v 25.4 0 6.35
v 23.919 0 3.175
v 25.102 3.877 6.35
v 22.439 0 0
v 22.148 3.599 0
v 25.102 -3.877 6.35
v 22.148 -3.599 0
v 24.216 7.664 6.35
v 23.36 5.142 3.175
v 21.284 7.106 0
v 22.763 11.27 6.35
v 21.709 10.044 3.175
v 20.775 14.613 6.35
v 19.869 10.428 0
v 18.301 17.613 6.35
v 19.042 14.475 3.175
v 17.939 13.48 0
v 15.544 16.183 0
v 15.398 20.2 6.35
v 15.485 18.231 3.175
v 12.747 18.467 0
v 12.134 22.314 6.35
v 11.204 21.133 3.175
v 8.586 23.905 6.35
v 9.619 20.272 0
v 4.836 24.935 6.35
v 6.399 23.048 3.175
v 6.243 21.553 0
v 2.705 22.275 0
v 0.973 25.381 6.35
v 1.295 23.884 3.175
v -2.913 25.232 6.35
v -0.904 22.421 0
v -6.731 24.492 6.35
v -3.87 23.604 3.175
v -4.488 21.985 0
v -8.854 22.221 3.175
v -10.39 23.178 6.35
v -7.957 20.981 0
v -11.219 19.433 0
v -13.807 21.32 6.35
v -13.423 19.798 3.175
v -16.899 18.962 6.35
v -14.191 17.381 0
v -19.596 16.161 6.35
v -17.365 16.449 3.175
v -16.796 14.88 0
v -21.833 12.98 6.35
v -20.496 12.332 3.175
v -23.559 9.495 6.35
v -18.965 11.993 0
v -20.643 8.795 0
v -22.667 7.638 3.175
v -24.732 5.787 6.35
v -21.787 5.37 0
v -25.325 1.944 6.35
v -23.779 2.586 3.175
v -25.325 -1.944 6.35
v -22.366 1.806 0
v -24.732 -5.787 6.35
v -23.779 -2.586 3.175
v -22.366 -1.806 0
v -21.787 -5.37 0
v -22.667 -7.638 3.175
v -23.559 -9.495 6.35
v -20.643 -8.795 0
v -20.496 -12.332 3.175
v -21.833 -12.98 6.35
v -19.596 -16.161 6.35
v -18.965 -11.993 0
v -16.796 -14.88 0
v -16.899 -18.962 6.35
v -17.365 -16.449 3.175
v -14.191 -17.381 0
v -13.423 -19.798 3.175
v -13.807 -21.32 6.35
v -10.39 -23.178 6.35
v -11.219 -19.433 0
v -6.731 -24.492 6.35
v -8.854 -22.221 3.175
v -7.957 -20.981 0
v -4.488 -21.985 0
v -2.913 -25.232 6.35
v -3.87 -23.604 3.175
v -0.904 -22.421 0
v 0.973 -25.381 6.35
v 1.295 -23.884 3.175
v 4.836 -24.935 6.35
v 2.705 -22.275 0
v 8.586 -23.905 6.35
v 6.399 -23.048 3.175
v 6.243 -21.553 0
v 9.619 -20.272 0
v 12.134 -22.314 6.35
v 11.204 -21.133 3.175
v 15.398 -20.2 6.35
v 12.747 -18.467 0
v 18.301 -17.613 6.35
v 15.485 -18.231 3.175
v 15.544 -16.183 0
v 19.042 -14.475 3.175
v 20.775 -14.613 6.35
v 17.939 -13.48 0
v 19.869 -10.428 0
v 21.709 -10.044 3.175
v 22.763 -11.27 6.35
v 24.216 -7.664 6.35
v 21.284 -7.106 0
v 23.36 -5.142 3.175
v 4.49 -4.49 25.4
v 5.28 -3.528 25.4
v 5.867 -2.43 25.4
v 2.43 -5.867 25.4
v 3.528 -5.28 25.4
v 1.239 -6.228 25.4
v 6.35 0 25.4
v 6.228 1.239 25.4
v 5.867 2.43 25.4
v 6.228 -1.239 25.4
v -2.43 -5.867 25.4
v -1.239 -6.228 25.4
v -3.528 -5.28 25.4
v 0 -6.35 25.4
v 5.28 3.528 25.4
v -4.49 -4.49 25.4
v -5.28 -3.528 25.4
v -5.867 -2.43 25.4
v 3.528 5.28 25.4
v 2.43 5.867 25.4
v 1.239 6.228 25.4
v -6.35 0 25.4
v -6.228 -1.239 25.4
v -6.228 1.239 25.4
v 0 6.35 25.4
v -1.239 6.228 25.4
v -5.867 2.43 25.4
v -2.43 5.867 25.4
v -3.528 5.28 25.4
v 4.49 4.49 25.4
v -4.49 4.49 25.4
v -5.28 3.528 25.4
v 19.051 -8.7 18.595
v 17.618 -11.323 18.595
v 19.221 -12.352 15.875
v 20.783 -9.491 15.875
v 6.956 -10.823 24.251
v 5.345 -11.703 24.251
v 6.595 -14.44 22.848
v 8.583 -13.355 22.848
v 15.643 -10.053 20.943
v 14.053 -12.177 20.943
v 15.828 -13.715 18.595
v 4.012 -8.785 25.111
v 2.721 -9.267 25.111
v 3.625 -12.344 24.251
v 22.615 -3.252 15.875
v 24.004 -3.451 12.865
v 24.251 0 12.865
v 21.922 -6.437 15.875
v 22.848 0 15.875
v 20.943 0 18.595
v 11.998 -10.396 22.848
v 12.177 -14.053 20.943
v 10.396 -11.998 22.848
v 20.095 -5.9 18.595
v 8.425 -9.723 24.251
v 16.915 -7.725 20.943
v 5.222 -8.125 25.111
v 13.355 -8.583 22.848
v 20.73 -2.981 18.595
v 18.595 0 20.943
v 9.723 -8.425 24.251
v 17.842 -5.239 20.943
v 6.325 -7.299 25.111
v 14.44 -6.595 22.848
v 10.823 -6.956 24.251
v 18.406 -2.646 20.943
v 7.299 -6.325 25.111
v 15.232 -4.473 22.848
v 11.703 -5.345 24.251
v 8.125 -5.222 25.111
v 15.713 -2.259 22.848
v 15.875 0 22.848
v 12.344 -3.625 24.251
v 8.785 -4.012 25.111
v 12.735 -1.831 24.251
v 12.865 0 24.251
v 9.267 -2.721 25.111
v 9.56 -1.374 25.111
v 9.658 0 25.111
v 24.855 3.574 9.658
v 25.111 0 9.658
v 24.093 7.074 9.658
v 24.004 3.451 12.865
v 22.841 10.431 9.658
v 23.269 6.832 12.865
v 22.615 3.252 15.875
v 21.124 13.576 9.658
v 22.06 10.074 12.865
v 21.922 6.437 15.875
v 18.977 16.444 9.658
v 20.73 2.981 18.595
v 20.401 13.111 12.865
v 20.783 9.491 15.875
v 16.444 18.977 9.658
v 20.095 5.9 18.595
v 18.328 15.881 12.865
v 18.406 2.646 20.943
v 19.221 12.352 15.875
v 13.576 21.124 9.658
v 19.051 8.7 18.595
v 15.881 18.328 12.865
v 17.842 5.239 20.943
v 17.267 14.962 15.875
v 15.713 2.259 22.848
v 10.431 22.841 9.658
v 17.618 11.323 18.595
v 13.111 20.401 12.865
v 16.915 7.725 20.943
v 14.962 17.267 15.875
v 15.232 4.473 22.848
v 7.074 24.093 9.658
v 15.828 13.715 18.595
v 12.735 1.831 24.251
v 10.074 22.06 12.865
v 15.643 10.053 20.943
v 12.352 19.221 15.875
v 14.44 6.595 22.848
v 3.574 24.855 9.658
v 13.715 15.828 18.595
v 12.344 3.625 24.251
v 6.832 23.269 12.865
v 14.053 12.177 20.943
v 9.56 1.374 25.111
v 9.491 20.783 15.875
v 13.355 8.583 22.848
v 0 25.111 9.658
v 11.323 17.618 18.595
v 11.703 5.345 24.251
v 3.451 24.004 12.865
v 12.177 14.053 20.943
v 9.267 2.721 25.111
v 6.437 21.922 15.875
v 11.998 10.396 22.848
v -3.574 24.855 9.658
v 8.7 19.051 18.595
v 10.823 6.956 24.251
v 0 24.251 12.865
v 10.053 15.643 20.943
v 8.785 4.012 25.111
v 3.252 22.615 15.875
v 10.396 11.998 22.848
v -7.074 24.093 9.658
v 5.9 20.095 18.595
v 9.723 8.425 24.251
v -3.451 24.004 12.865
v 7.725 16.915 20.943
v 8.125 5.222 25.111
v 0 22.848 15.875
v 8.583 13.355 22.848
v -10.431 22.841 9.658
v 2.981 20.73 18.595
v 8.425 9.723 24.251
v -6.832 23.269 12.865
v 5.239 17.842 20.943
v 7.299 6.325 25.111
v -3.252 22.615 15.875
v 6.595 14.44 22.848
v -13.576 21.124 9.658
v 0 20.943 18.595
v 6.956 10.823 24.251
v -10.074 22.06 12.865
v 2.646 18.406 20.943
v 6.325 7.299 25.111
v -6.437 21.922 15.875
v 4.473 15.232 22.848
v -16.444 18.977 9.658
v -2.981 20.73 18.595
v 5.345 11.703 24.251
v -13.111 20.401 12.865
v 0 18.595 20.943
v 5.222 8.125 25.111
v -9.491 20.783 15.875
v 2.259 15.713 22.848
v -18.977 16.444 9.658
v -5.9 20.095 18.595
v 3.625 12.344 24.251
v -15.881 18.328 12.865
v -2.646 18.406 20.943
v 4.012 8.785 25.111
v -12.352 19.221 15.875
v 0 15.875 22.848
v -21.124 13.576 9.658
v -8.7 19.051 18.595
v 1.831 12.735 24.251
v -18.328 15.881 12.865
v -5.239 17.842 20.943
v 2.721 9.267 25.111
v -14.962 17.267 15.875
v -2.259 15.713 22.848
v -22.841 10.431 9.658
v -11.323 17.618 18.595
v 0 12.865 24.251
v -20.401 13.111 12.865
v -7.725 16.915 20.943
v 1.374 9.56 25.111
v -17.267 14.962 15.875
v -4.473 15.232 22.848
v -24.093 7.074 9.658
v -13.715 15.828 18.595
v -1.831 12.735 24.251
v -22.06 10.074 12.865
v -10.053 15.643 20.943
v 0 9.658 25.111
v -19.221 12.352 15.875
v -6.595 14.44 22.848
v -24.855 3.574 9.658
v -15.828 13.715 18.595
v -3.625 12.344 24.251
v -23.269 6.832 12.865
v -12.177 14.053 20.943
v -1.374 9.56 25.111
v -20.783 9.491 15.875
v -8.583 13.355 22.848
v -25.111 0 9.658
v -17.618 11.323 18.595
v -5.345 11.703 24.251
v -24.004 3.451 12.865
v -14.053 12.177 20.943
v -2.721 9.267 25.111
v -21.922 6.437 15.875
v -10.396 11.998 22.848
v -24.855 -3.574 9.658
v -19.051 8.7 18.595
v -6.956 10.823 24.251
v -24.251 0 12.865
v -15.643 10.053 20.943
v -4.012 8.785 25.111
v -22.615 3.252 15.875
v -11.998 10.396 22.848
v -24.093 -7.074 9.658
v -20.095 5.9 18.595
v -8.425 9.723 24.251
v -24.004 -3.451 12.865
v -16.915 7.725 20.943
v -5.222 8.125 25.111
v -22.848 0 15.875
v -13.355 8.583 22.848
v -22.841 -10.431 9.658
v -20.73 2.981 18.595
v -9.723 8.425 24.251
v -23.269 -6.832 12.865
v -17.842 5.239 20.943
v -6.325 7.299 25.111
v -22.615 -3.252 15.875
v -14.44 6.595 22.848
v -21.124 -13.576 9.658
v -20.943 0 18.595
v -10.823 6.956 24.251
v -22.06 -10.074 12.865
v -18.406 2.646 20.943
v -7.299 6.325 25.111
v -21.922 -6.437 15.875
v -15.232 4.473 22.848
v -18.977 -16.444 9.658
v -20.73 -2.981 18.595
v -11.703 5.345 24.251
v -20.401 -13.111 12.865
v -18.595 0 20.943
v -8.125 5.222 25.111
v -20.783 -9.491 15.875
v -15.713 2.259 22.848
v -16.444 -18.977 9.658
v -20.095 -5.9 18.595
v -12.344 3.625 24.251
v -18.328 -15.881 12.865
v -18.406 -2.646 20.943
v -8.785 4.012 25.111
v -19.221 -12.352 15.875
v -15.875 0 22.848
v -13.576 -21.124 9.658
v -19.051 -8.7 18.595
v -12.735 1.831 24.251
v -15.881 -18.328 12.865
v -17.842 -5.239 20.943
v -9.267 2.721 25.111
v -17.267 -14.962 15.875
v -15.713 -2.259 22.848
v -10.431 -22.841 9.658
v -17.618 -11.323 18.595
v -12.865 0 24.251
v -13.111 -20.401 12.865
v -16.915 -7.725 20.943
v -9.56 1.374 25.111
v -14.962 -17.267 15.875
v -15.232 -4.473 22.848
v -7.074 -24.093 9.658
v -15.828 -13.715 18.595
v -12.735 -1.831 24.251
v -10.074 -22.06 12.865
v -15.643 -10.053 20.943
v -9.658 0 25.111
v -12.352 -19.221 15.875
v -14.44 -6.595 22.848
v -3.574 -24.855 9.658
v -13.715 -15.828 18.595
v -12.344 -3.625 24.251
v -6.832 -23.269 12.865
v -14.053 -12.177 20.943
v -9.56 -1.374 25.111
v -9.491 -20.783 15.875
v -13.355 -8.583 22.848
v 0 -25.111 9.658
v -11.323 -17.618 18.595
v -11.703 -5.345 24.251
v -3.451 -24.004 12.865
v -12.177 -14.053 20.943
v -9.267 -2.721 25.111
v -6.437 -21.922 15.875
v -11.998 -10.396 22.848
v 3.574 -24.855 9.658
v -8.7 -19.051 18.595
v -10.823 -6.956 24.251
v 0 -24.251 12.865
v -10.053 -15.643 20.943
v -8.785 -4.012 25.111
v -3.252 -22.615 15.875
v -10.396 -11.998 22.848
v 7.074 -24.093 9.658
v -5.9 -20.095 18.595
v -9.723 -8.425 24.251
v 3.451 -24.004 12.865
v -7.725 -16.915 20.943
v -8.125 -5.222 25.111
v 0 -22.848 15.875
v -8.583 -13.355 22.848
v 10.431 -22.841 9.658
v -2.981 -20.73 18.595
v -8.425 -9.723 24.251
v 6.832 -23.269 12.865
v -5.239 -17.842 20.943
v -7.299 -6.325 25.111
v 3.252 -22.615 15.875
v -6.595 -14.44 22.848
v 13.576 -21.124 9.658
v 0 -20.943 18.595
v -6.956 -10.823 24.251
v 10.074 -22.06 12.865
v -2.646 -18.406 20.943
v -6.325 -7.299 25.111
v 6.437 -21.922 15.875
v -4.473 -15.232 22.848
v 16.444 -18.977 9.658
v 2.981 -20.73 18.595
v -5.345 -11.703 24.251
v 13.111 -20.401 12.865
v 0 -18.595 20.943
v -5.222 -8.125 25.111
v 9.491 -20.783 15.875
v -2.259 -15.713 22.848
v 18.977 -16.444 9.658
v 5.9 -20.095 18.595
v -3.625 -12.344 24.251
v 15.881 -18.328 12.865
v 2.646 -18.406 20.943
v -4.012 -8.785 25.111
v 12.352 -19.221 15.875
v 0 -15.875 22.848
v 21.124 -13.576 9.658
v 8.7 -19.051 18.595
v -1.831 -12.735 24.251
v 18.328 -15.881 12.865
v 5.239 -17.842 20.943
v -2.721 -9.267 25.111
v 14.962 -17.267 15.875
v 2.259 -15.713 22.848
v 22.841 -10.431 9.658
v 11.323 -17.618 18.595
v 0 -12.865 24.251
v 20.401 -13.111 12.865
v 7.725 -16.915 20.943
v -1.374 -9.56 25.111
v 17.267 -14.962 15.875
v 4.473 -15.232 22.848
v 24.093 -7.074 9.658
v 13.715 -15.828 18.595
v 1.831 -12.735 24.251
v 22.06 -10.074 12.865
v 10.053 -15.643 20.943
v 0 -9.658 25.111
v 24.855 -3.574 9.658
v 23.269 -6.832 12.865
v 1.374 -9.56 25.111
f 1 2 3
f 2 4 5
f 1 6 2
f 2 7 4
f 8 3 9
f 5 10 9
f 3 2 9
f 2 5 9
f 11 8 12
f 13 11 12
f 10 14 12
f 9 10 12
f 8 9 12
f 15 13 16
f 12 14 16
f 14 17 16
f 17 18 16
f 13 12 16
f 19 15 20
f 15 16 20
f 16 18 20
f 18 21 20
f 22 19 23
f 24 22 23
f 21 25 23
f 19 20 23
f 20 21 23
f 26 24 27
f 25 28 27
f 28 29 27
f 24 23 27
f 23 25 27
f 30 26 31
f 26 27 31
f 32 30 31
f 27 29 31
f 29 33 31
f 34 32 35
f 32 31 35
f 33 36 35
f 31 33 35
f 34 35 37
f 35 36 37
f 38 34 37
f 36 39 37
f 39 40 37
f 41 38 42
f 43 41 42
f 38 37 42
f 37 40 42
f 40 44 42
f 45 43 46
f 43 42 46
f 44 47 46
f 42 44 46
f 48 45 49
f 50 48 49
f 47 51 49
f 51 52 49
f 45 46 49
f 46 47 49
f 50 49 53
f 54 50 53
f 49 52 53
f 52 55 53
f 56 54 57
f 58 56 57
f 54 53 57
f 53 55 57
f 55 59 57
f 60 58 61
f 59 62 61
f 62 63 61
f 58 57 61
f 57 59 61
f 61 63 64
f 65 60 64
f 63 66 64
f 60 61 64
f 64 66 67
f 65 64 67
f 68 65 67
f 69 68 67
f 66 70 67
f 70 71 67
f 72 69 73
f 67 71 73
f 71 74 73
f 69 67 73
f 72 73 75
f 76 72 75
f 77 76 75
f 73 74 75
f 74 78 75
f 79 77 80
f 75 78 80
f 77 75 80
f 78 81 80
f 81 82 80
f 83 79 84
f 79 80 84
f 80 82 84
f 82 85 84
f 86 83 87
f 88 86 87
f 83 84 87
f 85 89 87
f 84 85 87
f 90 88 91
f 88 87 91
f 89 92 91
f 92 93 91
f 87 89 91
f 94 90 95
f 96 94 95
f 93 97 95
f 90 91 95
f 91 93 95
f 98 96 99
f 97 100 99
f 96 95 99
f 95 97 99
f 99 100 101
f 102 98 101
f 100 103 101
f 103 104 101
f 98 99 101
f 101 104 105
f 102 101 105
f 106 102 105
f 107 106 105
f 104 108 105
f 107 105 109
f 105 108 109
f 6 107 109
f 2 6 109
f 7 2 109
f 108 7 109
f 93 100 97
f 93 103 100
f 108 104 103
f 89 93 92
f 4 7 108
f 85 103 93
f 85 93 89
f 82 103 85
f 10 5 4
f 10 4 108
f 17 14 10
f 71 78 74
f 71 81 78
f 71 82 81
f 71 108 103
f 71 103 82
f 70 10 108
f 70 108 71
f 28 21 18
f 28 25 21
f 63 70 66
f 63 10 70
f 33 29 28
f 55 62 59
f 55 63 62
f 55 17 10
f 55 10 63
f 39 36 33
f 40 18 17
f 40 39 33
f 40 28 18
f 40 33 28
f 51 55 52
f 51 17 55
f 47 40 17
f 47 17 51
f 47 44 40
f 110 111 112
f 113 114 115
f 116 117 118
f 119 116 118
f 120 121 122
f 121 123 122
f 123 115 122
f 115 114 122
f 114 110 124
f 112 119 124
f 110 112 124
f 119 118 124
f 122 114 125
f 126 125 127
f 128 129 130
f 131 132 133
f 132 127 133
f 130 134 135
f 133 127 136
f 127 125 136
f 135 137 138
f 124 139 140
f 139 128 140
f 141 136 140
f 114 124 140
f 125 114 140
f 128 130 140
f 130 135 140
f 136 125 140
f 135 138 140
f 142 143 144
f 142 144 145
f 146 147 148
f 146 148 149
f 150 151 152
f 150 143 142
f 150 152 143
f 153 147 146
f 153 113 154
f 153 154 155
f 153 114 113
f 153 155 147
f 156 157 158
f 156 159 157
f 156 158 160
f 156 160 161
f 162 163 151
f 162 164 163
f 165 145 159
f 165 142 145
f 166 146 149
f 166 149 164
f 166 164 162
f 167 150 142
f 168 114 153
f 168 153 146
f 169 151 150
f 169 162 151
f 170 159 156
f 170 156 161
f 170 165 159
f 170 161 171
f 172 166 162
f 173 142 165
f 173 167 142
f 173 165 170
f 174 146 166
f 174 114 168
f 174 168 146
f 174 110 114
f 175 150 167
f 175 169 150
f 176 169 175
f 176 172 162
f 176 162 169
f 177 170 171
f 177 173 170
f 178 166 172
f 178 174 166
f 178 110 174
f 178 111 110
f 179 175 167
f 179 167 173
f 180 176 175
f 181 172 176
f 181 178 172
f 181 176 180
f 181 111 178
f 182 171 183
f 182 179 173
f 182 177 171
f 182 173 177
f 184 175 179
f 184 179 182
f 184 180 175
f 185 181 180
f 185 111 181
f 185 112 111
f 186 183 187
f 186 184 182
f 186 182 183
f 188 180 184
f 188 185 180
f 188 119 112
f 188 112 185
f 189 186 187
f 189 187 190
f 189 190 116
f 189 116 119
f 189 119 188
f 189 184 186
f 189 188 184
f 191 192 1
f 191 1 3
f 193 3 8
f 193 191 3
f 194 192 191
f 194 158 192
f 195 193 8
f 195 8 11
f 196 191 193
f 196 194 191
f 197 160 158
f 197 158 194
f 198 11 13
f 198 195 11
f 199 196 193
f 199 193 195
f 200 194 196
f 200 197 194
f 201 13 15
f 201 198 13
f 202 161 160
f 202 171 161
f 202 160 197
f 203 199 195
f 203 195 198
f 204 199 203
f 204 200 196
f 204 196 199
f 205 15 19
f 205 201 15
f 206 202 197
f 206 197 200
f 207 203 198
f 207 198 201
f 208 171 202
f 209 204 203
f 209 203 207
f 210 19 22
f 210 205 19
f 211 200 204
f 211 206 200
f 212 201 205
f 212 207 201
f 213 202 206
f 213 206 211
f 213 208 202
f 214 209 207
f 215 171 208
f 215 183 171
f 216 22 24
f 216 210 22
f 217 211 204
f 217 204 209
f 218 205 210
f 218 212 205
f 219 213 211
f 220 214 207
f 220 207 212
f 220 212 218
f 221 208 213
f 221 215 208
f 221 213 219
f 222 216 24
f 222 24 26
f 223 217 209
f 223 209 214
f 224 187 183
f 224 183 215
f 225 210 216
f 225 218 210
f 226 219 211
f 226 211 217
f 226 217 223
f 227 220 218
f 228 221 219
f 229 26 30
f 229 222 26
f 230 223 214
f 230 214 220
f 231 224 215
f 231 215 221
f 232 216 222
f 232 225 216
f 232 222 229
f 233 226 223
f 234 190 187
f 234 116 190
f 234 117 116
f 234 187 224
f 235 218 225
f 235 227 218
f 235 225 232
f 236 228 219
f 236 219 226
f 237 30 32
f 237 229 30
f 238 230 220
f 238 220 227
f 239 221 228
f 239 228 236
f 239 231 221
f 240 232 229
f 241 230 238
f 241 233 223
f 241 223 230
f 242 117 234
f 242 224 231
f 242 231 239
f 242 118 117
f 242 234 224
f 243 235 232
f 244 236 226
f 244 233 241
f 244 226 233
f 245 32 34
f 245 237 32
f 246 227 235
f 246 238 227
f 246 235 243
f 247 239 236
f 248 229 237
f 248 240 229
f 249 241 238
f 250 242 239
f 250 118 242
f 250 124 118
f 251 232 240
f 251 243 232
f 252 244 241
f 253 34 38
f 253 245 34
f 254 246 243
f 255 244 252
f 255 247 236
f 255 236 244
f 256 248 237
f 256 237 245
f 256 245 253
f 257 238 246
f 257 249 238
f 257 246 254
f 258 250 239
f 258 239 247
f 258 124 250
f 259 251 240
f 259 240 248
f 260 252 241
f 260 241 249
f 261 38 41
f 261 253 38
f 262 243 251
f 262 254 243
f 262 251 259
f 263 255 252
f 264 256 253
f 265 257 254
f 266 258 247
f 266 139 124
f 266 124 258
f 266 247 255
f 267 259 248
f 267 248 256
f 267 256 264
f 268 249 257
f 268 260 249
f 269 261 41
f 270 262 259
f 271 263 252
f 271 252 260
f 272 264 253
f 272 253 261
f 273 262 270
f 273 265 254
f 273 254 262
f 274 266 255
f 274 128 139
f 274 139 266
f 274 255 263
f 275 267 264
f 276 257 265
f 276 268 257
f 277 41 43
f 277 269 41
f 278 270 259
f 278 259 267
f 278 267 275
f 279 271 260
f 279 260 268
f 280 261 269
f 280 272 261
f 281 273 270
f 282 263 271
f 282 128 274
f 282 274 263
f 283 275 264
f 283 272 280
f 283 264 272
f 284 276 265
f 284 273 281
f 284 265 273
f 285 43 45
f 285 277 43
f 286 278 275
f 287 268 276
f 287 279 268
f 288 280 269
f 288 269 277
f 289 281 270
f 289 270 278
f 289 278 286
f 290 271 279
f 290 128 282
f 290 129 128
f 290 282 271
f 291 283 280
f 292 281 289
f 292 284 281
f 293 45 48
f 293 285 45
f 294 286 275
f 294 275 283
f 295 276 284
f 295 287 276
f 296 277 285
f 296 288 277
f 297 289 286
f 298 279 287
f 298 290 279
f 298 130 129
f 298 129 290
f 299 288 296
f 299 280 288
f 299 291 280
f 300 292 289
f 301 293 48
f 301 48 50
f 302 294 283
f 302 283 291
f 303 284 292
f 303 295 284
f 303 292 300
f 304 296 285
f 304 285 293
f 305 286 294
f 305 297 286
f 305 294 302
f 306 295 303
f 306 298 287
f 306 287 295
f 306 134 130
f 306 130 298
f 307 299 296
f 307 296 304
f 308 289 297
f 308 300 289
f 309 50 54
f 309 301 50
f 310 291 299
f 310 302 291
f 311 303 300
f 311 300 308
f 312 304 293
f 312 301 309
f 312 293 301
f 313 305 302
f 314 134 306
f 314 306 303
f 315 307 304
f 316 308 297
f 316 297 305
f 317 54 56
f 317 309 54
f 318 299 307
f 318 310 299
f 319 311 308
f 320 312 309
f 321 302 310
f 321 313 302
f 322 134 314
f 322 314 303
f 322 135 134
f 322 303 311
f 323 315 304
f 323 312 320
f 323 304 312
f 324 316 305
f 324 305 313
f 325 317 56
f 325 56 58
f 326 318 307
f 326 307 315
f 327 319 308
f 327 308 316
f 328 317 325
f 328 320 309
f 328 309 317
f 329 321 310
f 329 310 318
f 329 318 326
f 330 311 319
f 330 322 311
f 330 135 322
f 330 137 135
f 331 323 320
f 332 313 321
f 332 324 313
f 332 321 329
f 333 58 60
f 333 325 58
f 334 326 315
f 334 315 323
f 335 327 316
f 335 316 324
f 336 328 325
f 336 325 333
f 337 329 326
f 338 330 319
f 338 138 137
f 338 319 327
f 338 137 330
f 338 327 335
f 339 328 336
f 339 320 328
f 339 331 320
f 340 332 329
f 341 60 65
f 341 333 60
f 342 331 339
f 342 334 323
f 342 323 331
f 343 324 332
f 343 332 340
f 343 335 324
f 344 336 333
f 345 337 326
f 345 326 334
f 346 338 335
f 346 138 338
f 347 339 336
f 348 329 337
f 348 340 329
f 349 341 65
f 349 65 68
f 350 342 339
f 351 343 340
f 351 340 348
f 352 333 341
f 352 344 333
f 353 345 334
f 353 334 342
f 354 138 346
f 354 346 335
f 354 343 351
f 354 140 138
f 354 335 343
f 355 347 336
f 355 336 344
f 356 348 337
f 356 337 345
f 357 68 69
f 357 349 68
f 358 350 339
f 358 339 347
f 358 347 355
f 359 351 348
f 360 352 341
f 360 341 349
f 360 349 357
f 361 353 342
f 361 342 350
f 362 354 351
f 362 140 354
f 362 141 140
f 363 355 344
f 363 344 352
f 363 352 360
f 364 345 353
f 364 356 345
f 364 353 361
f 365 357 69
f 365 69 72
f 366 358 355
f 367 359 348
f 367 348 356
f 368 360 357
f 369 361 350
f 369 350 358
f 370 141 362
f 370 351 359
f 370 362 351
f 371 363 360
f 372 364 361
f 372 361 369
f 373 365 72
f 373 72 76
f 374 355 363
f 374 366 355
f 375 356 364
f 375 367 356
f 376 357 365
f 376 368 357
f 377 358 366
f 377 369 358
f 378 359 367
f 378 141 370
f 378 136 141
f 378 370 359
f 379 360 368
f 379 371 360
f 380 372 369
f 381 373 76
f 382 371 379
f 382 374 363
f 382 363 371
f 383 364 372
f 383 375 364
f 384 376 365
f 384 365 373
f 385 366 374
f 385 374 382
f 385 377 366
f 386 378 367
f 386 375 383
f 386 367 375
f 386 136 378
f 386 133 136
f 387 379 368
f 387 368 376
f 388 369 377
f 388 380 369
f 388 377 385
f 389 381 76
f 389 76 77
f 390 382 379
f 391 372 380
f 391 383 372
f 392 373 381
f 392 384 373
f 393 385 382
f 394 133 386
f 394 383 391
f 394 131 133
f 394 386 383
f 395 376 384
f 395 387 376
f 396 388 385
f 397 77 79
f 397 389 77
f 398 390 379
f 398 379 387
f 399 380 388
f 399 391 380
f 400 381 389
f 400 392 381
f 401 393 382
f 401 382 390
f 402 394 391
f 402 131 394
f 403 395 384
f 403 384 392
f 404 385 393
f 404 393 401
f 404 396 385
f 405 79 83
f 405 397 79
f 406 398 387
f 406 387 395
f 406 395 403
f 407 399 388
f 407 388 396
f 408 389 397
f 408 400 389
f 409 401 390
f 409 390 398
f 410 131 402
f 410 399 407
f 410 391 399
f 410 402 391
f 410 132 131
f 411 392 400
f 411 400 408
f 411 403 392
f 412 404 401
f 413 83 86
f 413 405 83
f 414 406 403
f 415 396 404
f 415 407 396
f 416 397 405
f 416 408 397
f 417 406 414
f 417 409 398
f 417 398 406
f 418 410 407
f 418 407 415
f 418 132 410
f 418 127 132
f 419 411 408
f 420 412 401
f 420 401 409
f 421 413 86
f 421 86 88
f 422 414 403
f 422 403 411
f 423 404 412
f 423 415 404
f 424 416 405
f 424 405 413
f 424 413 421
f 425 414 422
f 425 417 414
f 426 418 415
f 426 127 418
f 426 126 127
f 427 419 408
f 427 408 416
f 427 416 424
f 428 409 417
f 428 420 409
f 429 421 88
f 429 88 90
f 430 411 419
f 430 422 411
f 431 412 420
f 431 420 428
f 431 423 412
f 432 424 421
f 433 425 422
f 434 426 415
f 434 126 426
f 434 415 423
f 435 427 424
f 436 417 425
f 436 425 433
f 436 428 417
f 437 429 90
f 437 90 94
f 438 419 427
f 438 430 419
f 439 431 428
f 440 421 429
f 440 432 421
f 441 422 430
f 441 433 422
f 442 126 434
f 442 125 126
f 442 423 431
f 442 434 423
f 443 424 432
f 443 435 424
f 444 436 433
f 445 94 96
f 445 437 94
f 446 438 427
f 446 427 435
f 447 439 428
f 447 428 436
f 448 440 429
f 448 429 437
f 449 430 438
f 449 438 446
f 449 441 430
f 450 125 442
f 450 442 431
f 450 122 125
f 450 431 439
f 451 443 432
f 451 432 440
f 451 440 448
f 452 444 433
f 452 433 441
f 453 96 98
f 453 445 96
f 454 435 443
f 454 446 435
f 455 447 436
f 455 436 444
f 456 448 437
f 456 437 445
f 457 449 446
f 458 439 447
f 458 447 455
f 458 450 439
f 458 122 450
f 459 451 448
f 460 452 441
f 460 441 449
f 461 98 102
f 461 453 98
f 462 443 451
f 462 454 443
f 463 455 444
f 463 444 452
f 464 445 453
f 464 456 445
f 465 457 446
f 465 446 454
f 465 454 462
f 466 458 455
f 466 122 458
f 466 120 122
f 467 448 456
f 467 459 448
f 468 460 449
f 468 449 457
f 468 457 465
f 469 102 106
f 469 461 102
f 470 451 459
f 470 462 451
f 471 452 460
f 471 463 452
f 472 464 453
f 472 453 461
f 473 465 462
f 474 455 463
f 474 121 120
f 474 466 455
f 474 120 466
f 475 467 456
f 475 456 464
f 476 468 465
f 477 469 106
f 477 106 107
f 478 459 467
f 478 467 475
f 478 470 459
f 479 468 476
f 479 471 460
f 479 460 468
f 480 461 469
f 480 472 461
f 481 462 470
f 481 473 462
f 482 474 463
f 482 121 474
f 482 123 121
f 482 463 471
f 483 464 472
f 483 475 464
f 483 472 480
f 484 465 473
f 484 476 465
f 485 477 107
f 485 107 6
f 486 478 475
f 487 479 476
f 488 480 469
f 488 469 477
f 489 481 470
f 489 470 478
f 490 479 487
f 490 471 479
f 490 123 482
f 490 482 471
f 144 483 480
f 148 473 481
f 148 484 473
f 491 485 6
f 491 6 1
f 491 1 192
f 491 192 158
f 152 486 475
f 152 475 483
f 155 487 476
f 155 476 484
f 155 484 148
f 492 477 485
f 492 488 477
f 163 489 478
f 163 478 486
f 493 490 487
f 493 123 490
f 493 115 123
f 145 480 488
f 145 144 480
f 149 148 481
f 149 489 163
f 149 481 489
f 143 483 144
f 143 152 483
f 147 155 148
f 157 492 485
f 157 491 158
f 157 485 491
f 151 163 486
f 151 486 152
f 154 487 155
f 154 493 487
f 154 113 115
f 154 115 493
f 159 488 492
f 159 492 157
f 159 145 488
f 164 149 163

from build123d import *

# Parameters (mm, degrees)
F0_W     = 25.4
F0_H     = 25.4
F2_R     = 19.05
F3_SIZE2 = 2.961044
F3_SIZE  = 6.34999


# Not quite as in the source:
# - a fillet or chamfer is up to 0.001 mm smaller than in the source, because OpenCascade refuses the exact size


with BuildPart() as f1:
    # F0 (on Front) → F1 (revolve)
    with BuildSketch(Plane.XZ):
        with Locations((12.7, 12.7)):
            Rectangle(F0_W, F0_H)
    revolve(axis=Axis((0, 0, 12.7), (0, 0, 1)))

    # F2
    f2_edges = [f1.edges().sort_by_distance(p)[0] for p in [
        (-25.4, 0, 25.4),
    ]]
    fillet(f2_edges, radius=F2_R)

    # F3 (size 6.35 and 2.9610536293 in the source; OpenCascade refuses exactly that, so slightly less here)
    f3_edges = [f1.edges().sort_by_distance(p)[0] for p in [
        (-25.4, 0, 0),
    ]]
    chamfer(f3_edges, length=F3_SIZE, length2=F3_SIZE2)


solid = f1.part
